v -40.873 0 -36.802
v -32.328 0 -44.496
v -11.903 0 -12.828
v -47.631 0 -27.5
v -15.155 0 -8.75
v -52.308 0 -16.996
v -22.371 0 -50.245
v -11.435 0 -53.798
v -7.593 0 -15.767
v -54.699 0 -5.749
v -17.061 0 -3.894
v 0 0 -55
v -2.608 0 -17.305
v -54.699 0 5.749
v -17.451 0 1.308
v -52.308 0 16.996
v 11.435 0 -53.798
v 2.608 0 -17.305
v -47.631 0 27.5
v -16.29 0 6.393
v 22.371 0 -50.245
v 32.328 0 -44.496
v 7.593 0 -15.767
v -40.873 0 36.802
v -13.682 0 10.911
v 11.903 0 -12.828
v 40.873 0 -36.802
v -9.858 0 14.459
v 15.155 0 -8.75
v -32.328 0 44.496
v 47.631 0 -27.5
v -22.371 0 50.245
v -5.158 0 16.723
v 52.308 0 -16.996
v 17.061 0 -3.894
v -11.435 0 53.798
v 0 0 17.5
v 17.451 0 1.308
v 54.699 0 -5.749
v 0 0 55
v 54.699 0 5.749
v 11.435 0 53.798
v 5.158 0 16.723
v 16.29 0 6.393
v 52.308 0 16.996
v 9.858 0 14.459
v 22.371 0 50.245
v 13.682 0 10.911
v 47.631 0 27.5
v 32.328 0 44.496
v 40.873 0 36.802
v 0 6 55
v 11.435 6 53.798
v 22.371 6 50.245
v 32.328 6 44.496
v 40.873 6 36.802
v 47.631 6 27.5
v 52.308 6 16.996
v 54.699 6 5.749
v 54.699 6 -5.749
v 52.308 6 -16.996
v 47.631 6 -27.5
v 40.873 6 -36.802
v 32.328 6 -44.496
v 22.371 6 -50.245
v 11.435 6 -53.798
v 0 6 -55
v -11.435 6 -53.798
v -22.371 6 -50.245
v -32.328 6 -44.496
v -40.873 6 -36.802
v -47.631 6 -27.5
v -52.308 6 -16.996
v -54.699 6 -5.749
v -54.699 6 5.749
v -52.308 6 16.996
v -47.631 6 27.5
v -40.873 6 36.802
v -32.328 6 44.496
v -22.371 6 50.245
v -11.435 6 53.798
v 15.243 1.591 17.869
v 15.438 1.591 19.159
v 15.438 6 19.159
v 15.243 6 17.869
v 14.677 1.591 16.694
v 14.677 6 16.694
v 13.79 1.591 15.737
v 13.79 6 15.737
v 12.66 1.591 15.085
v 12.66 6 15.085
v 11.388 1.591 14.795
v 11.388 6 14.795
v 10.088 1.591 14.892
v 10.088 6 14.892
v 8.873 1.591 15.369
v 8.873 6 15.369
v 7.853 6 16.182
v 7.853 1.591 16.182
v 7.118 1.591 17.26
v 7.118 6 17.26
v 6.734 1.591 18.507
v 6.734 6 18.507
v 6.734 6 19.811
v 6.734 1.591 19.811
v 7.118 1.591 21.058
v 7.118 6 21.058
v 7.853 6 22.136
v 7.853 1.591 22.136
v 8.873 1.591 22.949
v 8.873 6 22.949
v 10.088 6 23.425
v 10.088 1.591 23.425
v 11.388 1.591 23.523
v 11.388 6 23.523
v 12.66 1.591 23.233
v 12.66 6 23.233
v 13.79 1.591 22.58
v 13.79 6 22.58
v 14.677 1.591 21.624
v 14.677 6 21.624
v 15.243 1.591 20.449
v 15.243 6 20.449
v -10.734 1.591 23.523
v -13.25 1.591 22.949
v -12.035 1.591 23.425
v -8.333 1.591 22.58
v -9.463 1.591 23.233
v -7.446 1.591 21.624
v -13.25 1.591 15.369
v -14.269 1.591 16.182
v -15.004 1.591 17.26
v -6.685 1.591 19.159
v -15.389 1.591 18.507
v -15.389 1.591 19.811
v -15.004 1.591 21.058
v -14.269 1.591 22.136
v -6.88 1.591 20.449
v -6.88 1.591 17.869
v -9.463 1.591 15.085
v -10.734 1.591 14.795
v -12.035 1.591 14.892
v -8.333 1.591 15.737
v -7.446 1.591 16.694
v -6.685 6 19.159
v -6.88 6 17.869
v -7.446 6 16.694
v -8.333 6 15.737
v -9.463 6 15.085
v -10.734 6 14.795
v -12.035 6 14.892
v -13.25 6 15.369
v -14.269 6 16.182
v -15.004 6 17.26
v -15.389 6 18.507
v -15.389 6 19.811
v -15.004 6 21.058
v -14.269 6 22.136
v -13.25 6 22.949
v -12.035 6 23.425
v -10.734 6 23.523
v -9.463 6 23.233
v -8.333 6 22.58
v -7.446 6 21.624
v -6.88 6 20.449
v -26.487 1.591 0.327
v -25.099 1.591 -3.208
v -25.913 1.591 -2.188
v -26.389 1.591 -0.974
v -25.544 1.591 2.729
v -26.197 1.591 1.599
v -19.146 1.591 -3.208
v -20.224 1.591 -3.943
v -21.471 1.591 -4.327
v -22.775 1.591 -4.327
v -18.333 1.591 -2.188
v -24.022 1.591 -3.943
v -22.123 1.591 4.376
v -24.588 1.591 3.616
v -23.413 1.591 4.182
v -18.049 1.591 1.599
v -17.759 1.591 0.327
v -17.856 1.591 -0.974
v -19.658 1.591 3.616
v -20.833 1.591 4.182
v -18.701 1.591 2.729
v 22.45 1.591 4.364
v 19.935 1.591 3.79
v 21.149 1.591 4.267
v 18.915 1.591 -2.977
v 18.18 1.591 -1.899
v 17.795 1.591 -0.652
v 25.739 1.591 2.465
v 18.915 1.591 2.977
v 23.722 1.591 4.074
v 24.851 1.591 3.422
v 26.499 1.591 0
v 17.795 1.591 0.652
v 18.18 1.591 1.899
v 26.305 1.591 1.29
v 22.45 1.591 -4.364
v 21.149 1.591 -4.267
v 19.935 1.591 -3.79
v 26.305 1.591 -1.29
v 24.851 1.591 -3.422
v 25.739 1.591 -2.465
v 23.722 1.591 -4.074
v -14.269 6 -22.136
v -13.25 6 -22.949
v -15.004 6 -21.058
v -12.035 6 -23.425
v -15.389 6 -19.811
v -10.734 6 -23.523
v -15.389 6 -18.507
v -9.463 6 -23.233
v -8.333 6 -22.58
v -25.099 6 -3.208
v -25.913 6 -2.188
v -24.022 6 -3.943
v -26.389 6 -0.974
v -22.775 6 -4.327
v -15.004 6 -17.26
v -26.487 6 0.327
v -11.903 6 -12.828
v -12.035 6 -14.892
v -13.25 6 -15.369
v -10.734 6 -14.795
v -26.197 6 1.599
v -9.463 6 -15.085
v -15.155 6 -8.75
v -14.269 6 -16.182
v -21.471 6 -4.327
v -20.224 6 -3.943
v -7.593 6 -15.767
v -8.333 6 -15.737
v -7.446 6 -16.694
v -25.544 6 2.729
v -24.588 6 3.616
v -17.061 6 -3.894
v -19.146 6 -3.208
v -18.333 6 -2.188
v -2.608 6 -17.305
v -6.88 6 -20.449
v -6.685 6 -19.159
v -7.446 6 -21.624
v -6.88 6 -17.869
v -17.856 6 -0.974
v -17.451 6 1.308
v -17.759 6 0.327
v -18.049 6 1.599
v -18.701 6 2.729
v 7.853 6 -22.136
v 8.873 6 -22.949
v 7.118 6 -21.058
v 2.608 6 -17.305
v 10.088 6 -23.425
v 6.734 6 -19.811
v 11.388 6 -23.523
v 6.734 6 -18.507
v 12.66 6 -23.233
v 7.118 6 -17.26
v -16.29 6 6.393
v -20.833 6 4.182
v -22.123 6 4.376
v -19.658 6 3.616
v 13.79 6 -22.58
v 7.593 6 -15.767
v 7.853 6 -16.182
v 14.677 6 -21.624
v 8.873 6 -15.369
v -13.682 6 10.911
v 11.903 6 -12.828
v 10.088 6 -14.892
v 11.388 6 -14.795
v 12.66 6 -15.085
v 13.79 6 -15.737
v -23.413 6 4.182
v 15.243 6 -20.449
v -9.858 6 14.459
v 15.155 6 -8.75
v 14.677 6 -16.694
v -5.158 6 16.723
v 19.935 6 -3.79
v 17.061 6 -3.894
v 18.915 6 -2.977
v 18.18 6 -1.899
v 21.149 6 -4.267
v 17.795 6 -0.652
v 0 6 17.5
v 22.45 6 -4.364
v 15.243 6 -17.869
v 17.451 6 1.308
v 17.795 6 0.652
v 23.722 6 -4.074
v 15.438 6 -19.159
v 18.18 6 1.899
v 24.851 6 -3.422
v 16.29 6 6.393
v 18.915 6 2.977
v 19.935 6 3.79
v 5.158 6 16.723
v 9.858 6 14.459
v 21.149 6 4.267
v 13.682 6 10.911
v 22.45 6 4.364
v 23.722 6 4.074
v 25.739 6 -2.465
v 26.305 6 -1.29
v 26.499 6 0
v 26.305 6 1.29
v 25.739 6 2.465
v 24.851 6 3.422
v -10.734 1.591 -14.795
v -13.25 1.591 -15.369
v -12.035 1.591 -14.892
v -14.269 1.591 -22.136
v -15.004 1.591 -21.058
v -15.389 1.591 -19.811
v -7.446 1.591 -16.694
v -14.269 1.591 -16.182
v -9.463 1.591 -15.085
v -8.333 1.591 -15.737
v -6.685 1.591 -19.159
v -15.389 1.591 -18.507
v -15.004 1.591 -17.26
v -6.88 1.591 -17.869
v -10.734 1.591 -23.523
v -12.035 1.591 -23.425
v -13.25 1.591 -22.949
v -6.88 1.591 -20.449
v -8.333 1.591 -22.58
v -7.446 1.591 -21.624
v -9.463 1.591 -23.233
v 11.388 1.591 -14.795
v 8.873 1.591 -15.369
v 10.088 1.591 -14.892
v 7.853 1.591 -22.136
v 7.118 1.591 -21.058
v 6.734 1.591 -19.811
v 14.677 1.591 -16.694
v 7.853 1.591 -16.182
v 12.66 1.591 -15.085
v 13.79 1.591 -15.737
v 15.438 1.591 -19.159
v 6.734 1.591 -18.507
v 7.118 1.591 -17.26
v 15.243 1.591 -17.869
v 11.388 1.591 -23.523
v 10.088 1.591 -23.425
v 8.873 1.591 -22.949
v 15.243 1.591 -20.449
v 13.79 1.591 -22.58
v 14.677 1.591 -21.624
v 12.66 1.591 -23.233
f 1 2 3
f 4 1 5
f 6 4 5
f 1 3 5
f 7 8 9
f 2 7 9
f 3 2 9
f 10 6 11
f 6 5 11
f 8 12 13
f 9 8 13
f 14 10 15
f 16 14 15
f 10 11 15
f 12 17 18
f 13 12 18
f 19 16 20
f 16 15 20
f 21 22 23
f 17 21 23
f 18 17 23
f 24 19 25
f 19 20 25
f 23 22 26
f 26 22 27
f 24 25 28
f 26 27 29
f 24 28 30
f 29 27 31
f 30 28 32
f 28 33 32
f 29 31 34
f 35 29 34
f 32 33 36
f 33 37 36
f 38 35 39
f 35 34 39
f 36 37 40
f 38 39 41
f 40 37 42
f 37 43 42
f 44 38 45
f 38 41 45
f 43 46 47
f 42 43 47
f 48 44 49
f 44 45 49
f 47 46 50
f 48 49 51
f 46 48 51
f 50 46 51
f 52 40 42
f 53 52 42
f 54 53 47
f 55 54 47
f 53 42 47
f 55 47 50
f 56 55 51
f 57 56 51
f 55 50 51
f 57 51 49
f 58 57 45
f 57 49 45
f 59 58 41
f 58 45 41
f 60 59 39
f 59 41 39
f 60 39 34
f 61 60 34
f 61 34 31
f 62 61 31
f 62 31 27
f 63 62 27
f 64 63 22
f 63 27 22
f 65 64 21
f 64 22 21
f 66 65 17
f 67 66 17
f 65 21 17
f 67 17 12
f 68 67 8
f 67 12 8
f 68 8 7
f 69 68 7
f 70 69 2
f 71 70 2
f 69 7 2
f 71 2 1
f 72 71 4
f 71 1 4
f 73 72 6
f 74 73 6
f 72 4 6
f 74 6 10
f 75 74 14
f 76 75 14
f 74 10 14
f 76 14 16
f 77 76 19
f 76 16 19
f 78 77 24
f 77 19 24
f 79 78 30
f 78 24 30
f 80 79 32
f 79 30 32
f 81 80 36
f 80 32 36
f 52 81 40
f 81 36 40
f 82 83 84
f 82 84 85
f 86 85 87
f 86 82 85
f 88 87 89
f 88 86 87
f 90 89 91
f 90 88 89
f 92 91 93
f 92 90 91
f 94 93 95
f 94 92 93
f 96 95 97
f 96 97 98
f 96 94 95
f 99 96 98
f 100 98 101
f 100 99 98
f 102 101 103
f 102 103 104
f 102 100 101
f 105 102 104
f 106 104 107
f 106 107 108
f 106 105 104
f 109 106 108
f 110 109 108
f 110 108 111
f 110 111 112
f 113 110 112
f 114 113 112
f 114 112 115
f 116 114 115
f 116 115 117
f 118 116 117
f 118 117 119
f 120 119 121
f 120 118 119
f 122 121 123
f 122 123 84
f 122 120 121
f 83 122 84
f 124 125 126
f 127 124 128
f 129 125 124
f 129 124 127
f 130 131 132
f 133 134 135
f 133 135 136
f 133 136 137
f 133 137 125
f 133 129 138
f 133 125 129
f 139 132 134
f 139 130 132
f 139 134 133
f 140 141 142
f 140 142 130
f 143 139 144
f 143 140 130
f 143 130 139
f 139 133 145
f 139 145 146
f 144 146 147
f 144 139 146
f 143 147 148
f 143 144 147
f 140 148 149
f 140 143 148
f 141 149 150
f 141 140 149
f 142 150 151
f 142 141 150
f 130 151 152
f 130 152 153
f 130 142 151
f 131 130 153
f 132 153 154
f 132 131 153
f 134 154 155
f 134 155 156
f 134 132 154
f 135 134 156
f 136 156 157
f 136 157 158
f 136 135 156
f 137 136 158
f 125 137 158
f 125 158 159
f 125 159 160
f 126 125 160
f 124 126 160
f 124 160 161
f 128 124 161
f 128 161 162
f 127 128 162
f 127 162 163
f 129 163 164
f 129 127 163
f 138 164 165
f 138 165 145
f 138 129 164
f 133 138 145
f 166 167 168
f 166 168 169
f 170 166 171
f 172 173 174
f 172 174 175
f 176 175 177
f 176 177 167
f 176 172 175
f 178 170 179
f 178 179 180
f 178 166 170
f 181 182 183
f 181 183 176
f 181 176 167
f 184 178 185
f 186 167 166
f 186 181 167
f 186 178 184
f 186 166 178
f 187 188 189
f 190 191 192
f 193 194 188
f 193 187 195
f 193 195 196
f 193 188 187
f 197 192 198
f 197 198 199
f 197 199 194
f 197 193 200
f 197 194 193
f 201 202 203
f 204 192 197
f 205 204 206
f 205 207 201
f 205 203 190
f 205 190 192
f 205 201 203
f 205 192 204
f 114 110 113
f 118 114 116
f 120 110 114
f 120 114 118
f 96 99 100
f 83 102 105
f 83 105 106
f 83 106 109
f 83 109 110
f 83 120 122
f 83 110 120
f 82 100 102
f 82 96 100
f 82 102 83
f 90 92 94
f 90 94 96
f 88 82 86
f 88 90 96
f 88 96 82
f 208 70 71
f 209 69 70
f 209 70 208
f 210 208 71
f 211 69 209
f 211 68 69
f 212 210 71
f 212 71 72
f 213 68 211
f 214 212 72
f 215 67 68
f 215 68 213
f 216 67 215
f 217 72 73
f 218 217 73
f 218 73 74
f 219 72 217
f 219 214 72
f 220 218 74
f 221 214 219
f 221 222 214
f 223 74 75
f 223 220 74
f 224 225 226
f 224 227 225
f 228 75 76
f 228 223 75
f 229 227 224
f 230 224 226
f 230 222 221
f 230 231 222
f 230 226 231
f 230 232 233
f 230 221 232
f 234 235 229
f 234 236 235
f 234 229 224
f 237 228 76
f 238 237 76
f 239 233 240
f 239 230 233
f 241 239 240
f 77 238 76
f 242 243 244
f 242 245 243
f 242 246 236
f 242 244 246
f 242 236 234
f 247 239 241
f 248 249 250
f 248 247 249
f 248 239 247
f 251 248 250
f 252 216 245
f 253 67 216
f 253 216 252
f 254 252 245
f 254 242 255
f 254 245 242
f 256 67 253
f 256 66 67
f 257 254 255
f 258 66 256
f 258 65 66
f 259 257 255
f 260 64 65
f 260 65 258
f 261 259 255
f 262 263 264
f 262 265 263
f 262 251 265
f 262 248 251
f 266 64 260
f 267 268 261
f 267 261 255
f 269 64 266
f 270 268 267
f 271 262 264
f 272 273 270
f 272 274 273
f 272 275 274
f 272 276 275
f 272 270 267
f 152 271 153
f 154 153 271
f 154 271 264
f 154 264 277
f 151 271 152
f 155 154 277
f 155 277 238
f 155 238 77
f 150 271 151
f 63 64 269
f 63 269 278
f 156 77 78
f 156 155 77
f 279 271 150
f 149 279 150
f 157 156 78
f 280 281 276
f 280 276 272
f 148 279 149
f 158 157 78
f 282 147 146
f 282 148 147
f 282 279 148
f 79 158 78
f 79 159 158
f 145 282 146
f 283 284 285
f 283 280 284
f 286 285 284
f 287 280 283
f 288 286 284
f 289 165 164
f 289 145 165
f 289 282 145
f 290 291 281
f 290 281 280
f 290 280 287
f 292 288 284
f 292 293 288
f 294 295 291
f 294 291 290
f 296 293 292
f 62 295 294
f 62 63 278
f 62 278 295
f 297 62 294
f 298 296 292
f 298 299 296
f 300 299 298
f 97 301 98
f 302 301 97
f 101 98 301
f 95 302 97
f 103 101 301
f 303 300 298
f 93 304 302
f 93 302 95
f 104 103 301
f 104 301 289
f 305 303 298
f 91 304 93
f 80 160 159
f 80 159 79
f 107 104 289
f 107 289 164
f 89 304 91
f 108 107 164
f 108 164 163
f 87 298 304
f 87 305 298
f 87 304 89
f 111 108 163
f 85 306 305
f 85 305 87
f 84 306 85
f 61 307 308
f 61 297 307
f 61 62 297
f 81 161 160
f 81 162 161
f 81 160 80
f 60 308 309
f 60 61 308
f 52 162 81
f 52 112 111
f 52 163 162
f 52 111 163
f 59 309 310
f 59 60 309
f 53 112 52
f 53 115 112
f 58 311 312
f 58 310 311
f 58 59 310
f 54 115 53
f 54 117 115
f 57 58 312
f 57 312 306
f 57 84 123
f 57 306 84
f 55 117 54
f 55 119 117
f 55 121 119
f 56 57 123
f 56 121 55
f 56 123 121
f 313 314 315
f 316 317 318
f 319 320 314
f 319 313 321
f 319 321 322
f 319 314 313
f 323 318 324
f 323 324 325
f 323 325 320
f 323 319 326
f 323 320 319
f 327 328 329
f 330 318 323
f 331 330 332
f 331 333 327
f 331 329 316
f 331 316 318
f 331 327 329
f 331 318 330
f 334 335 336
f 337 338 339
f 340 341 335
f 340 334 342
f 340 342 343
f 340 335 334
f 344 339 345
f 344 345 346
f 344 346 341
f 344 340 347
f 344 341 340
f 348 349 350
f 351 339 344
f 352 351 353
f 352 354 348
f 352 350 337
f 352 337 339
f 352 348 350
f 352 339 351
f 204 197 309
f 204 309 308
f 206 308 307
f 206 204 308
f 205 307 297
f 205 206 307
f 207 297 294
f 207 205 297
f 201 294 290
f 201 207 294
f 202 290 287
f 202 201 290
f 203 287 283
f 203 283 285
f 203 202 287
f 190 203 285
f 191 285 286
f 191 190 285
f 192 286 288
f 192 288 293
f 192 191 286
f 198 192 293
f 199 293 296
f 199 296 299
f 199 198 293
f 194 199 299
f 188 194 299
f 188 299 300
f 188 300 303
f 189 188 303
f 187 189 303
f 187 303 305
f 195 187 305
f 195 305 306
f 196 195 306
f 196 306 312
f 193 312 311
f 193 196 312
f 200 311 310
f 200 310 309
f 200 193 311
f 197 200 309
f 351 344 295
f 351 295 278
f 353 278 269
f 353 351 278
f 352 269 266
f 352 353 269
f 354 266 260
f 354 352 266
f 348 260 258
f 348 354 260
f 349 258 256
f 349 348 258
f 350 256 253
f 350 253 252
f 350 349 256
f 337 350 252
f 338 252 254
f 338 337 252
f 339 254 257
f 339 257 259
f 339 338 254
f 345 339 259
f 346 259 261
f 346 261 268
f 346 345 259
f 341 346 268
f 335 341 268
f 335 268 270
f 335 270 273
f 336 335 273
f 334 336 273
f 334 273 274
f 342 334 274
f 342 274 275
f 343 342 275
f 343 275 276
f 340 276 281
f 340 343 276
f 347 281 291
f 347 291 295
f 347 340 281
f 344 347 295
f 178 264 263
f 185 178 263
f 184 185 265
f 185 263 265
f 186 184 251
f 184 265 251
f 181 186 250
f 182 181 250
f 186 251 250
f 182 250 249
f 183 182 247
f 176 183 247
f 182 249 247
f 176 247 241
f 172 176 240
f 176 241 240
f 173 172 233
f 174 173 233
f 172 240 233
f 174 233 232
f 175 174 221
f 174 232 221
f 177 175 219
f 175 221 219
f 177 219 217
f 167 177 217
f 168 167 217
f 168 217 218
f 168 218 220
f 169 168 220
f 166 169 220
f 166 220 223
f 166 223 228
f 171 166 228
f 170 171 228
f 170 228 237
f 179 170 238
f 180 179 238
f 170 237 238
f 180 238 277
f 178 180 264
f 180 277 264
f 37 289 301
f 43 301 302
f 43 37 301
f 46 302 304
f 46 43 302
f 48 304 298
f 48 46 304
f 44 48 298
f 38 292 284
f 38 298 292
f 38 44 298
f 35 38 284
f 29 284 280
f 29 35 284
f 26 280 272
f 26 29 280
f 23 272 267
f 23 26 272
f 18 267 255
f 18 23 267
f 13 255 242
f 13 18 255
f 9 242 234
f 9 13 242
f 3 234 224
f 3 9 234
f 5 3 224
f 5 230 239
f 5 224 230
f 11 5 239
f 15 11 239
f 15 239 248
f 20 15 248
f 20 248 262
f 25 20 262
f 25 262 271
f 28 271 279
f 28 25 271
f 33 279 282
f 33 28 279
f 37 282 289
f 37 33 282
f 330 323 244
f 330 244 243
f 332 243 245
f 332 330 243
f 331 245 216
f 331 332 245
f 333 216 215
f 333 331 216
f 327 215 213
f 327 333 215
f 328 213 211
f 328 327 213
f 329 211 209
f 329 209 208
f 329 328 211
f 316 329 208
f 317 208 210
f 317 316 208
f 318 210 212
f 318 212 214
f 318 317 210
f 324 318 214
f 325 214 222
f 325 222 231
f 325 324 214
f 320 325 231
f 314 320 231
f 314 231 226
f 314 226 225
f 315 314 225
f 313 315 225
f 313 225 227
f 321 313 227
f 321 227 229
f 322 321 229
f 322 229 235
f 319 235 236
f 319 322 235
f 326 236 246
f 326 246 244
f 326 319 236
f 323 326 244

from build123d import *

# Parameters (mm, degrees)
SKETCH1_R           = 55
BOSS_EXTRUDE1_DEPTH = 6
SKETCH2_R           = 17.5
CUT_EXTRUDE1_DEPTH  = 79.012819459
SKETCH3_R           = 4.37630442
CUT_EXTRUDE2_DEPTH  = 4.409124383
CIRPATTERN1_COUNT   = 6


with BuildPart() as part:
    # Sketch1 → Boss-Extrude1 (new body)
    with BuildSketch(Plane(origin=(0, 0, 0), x_dir=(1, 0, 0), z_dir=(0, 1, 0))):
        Circle(SKETCH1_R)
    extrude(amount=BOSS_EXTRUDE1_DEPTH)

    # Sketch2 → Cut-Extrude1 (cut, through all)
    with BuildSketch(Plane(origin=(0, 0, 0), x_dir=(1, 0, 0), z_dir=(0, 1, 0))):
        Circle(SKETCH2_R)
    extrude(amount=CUT_EXTRUDE1_DEPTH, mode=Mode.SUBTRACT)

    # Sketch3 → Cut-Extrude2 (cut)
    with BuildSketch(Plane(origin=(0, 6, 0), x_dir=(1, 0, 0), z_dir=(0, 1, 0))):
        with Locations((-22.122792646, 0)):
            Circle(SKETCH3_R)
    cut_extrude2 = extrude(amount=-CUT_EXTRUDE2_DEPTH, mode=Mode.SUBTRACT)

    # CirPattern1: Cut-Extrude2 ×6 about axis
    cirpattern1_axis = Axis((0, 0, 0), (0, 1, 0))
    for i in range(1, CIRPATTERN1_COUNT):
        add(cut_extrude2.rotate(cirpattern1_axis, i * 360 / CIRPATTERN1_COUNT), mode=Mode.SUBTRACT)


solid = part.part
